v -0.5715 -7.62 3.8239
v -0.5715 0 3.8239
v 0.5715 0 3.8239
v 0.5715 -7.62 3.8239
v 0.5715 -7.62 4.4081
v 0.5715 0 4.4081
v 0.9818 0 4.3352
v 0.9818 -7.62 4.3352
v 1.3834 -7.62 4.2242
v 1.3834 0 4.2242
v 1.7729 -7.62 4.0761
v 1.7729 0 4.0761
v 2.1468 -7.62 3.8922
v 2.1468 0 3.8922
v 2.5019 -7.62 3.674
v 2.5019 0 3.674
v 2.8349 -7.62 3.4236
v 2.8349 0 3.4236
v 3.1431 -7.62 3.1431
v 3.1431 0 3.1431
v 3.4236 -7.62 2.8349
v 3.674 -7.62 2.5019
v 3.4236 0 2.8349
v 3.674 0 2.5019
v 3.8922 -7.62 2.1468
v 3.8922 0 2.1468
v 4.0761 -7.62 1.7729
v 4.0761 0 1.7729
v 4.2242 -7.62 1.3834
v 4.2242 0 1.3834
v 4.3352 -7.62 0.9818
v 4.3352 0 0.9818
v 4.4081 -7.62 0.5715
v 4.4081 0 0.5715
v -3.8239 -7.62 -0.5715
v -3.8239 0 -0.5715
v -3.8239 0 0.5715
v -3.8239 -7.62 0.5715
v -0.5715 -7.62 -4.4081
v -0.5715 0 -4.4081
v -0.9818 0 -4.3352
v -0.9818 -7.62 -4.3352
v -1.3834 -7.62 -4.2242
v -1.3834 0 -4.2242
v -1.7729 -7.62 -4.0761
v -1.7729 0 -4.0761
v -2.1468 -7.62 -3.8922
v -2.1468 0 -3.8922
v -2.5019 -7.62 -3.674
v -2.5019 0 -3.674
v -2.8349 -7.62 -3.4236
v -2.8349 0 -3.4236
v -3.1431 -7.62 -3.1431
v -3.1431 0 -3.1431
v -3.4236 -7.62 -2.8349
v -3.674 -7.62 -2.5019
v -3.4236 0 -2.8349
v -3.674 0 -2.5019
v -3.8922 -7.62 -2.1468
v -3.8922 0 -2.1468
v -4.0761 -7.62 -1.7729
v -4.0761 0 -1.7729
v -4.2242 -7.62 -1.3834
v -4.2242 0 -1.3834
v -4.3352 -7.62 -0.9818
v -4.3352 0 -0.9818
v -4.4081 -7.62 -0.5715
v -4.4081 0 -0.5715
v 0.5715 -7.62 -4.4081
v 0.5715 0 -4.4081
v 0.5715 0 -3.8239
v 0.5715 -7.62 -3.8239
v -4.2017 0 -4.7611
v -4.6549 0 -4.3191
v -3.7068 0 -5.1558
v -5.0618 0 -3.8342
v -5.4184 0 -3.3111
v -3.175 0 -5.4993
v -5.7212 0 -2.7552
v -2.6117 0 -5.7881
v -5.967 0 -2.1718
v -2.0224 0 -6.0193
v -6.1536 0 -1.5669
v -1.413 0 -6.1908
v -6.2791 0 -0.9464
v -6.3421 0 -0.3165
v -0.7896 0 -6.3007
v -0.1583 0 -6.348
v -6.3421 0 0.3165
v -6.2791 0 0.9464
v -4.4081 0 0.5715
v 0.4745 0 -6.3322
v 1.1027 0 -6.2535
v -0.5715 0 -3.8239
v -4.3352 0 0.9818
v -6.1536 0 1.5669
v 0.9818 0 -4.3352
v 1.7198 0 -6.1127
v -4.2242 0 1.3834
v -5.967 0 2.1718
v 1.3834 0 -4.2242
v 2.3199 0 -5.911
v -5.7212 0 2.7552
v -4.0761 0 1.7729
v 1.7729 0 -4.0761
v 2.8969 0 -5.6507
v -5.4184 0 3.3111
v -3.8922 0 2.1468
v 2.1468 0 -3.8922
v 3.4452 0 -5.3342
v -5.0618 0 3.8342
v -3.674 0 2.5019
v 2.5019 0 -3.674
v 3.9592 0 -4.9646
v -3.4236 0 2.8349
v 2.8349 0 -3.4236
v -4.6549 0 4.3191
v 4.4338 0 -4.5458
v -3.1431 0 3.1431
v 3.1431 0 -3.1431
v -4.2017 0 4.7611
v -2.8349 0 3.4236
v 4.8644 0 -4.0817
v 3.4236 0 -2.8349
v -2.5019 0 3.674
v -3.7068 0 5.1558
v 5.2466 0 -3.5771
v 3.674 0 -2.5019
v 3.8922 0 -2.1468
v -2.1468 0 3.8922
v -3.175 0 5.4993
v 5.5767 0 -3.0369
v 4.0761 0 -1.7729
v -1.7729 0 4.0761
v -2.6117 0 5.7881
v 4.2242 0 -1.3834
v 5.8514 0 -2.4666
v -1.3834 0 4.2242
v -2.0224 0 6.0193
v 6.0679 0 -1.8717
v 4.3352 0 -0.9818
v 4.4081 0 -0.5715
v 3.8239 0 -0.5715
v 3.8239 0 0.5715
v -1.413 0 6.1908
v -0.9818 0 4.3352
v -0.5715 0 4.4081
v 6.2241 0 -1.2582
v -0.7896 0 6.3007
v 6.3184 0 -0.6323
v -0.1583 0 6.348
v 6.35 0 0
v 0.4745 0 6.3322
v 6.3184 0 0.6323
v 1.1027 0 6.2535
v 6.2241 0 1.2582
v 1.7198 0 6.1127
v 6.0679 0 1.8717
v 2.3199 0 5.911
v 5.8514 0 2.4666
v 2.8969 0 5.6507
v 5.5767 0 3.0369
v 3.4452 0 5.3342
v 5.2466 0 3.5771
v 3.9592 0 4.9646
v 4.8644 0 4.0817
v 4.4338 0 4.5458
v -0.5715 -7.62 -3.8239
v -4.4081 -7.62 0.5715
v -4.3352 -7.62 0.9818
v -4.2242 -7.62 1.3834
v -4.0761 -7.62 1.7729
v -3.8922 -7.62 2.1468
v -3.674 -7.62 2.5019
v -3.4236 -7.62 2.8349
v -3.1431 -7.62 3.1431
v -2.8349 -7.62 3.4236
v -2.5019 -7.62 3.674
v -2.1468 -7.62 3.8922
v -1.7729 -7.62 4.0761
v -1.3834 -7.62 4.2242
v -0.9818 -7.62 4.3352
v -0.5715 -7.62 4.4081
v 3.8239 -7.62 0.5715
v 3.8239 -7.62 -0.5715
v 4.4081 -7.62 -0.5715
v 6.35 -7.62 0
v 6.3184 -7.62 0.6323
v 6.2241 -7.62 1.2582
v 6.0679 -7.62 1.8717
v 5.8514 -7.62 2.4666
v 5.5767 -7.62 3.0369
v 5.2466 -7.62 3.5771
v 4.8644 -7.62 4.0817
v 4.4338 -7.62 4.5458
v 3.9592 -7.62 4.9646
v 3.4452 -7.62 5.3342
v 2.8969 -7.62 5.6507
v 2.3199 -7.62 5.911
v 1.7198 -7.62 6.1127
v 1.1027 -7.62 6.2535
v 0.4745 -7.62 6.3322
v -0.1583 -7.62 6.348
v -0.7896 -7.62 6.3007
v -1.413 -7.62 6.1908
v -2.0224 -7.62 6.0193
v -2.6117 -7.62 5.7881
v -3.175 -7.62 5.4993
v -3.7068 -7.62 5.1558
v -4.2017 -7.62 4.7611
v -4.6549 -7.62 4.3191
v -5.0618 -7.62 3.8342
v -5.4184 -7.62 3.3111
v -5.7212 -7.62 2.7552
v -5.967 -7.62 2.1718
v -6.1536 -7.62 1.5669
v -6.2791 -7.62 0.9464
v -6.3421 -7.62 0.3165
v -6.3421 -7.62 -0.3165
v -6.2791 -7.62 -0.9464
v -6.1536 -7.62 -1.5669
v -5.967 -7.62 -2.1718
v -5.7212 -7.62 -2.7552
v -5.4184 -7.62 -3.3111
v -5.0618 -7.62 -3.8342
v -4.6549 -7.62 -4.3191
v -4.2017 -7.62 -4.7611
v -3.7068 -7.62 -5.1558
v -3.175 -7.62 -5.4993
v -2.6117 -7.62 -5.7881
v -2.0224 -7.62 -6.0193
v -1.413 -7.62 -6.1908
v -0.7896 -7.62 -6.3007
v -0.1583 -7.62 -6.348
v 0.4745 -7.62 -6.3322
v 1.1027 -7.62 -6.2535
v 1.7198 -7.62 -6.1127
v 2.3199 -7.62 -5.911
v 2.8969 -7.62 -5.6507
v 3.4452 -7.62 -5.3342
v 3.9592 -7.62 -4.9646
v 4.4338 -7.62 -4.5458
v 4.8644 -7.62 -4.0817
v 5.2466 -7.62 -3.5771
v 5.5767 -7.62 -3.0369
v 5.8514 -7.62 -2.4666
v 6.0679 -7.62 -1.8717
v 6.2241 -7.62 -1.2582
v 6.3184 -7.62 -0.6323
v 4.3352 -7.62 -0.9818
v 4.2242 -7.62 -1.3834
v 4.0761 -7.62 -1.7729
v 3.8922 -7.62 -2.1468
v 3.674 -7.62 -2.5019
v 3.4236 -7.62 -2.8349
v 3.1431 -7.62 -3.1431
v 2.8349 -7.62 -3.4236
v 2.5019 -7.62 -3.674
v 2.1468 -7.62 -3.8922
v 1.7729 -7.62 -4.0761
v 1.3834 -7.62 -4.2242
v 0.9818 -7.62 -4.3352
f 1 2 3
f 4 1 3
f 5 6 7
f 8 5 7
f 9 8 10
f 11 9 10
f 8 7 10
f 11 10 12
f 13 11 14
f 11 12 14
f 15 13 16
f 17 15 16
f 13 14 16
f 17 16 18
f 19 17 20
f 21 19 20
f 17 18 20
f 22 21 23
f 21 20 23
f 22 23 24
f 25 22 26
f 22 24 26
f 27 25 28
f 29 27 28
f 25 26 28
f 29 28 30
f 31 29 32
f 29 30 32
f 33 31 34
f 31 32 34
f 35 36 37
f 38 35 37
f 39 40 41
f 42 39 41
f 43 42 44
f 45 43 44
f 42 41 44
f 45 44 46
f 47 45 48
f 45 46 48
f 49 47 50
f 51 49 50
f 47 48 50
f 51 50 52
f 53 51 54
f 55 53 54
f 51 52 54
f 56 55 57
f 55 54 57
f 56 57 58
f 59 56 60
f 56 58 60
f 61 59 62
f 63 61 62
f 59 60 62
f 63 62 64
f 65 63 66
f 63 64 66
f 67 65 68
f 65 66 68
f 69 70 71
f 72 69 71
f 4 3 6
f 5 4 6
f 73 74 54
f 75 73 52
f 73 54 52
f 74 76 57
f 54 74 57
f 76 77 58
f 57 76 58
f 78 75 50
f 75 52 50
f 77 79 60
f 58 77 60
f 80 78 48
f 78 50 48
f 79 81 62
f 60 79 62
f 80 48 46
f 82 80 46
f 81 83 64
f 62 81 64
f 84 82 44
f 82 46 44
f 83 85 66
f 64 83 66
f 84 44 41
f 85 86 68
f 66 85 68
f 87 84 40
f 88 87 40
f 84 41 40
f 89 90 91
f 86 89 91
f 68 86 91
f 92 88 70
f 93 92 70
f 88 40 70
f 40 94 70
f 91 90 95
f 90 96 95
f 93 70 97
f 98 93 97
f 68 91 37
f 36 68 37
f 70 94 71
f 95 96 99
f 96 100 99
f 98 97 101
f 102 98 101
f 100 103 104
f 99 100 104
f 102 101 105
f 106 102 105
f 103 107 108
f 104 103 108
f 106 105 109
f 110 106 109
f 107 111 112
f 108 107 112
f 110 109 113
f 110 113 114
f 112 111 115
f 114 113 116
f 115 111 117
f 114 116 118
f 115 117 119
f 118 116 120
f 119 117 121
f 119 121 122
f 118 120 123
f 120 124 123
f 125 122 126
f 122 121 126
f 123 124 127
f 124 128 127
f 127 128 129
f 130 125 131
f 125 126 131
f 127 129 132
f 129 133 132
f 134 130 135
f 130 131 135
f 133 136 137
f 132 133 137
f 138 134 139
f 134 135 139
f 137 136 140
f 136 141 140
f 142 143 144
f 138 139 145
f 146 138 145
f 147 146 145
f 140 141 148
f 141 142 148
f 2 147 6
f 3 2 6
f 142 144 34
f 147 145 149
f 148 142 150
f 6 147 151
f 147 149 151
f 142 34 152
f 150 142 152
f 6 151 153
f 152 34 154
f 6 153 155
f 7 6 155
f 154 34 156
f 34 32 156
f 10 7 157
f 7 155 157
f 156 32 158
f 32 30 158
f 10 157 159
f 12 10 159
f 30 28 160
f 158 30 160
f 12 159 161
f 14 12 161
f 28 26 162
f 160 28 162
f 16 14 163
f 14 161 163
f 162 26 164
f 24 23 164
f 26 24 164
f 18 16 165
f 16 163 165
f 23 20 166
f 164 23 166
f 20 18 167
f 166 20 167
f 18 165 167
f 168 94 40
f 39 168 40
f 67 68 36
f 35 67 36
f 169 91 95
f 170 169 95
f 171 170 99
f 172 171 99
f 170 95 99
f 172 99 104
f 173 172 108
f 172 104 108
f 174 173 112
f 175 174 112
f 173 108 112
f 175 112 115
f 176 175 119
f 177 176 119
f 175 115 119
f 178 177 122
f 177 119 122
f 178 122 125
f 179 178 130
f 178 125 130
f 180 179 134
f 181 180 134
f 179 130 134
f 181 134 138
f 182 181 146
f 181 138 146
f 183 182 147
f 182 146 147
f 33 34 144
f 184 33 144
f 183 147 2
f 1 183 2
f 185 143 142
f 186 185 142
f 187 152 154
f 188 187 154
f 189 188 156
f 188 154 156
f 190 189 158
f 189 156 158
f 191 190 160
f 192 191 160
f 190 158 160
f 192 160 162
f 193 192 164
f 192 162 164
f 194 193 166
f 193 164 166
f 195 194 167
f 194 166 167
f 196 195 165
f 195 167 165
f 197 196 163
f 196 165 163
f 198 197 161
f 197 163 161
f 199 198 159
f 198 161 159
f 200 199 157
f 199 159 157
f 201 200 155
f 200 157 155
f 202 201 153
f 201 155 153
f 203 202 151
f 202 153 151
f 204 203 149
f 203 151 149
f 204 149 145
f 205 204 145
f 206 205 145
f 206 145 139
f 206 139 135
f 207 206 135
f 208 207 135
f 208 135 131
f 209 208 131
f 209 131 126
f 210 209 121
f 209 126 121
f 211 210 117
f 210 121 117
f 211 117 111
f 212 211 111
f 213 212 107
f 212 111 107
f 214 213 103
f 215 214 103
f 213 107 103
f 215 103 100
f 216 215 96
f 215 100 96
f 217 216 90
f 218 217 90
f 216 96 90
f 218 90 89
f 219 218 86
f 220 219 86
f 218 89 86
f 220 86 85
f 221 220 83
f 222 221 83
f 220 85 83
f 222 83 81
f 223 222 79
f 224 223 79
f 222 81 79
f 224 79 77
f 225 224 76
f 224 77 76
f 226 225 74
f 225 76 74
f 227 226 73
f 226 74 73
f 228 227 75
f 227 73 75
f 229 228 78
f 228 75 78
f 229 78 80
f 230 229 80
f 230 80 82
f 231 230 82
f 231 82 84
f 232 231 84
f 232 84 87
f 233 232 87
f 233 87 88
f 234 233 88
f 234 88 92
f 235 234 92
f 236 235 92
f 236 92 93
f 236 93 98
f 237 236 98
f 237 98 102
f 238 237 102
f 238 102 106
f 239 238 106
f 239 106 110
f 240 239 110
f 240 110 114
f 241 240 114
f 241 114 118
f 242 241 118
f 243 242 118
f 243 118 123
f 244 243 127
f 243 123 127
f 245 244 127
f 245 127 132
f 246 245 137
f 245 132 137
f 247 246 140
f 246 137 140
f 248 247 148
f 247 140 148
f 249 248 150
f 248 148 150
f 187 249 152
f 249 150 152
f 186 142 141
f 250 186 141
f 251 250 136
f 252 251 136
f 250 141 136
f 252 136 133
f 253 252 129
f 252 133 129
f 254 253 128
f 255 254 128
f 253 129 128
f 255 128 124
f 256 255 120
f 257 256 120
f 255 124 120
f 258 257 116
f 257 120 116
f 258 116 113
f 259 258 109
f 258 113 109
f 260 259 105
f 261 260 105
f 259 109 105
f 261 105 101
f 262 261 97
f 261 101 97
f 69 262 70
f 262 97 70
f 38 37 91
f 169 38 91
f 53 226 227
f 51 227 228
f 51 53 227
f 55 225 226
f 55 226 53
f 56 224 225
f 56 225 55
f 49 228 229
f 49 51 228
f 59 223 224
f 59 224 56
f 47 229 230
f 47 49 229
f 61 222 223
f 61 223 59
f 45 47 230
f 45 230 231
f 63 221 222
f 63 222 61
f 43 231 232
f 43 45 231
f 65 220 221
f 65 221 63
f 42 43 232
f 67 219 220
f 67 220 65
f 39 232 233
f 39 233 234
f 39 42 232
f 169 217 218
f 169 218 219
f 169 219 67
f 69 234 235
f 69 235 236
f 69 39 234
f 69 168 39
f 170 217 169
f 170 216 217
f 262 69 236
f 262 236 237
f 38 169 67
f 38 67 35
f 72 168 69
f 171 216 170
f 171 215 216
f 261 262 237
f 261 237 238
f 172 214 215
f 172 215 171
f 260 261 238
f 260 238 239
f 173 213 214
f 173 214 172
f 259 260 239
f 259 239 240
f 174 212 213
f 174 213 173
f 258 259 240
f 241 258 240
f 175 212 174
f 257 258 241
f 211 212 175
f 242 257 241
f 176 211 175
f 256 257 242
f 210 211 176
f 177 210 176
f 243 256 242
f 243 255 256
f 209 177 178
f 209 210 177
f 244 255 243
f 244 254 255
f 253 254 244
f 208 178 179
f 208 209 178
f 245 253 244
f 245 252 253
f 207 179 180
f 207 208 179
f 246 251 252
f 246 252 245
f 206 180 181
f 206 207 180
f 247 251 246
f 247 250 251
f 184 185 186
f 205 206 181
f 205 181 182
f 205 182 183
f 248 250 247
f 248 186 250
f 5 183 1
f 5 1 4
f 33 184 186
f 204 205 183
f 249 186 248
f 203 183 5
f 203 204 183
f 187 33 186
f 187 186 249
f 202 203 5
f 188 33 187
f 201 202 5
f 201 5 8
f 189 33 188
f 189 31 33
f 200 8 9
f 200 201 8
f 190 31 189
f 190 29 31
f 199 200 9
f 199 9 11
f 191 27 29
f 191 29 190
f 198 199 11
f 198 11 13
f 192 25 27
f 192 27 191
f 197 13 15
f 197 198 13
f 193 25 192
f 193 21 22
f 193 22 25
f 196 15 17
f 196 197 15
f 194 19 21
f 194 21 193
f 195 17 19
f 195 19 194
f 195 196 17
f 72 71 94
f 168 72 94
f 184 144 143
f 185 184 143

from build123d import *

# Parameters (mm, degrees)
F0_R     = 6.35
F1_DEPTH = 7.62


with BuildPart() as f1:
    # F0 (on Front) → F1 (new body)
    with BuildSketch(Plane.XZ):
        Circle(F0_R)
        with BuildLine():
            ThreePointArc((4.408108, 0.5715), (4.435767, 0.286345), (4.445, 0))
            ThreePointArc((4.445, 0), (4.435767, -0.286345), (4.408108, -0.5715))
            ThreePointArc((4.408108, -0.5715), (3.14309, -3.14309), (0.5715, -4.408108))
            ThreePointArc((0.5715, -4.408108), (0, -4.445), (-0.5715, -4.408108))
            ThreePointArc((-0.5715, -4.408108), (-3.14309, -3.14309), (-4.408108, -0.5715))
            ThreePointArc((-4.408108, -0.5715), (-4.445, 0), (-4.408108, 0.5715))
            ThreePointArc((-4.408108, 0.5715), (-3.14309, 3.14309), (-0.5715, 4.408108))
            ThreePointArc((-0.5715, 4.408108), (0, 4.445), (0.5715, 4.408108))
            ThreePointArc((0.5715, 4.408108), (3.14309, 3.14309), (4.408108, 0.5715))
        make_face(mode=Mode.SUBTRACT)
        with BuildLine():
            Line((0.5715, 3.823908), (0.5715, 4.408108))
            ThreePointArc((0.5715, 4.408108), (0, 4.445), (-0.5715, 4.408108))
            Line((-0.5715, 4.408108), (-0.5715, 3.823908))
            Line((-0.5715, 3.823908), (0.5715, 3.823908))
        make_face()
        with BuildLine():
            ThreePointArc((4.408108, -0.5715), (4.435767, -0.286345), (4.445, 0))
            ThreePointArc((4.445, 0), (4.435767, 0.286345), (4.408108, 0.5715))
            Line((4.408108, 0.5715), (3.823908, 0.5715))
            Line((3.823908, 0.5715), (3.823908, -0.5715))
            Line((3.823908, -0.5715), (4.408108, -0.5715))
        make_face()
        with BuildLine():
            ThreePointArc((-0.5715, -4.408108), (0, -4.445), (0.5715, -4.408108))
            Line((0.5715, -4.408108), (0.5715, -3.823908))
            Line((0.5715, -3.823908), (-0.5715, -3.823908))
            Line((-0.5715, -3.823908), (-0.5715, -4.408108))
        make_face()
        with BuildLine():
            Line((-3.823908, 0.5715), (-4.408108, 0.5715))
            ThreePointArc((-4.408108, 0.5715), (-4.445, 0), (-4.408108, -0.5715))
            Line((-4.408108, -0.5715), (-3.823908, -0.5715))
            Line((-3.823908, -0.5715), (-3.823908, 0.5715))
        make_face()
    extrude(amount=F1_DEPTH)


solid = f1.part
